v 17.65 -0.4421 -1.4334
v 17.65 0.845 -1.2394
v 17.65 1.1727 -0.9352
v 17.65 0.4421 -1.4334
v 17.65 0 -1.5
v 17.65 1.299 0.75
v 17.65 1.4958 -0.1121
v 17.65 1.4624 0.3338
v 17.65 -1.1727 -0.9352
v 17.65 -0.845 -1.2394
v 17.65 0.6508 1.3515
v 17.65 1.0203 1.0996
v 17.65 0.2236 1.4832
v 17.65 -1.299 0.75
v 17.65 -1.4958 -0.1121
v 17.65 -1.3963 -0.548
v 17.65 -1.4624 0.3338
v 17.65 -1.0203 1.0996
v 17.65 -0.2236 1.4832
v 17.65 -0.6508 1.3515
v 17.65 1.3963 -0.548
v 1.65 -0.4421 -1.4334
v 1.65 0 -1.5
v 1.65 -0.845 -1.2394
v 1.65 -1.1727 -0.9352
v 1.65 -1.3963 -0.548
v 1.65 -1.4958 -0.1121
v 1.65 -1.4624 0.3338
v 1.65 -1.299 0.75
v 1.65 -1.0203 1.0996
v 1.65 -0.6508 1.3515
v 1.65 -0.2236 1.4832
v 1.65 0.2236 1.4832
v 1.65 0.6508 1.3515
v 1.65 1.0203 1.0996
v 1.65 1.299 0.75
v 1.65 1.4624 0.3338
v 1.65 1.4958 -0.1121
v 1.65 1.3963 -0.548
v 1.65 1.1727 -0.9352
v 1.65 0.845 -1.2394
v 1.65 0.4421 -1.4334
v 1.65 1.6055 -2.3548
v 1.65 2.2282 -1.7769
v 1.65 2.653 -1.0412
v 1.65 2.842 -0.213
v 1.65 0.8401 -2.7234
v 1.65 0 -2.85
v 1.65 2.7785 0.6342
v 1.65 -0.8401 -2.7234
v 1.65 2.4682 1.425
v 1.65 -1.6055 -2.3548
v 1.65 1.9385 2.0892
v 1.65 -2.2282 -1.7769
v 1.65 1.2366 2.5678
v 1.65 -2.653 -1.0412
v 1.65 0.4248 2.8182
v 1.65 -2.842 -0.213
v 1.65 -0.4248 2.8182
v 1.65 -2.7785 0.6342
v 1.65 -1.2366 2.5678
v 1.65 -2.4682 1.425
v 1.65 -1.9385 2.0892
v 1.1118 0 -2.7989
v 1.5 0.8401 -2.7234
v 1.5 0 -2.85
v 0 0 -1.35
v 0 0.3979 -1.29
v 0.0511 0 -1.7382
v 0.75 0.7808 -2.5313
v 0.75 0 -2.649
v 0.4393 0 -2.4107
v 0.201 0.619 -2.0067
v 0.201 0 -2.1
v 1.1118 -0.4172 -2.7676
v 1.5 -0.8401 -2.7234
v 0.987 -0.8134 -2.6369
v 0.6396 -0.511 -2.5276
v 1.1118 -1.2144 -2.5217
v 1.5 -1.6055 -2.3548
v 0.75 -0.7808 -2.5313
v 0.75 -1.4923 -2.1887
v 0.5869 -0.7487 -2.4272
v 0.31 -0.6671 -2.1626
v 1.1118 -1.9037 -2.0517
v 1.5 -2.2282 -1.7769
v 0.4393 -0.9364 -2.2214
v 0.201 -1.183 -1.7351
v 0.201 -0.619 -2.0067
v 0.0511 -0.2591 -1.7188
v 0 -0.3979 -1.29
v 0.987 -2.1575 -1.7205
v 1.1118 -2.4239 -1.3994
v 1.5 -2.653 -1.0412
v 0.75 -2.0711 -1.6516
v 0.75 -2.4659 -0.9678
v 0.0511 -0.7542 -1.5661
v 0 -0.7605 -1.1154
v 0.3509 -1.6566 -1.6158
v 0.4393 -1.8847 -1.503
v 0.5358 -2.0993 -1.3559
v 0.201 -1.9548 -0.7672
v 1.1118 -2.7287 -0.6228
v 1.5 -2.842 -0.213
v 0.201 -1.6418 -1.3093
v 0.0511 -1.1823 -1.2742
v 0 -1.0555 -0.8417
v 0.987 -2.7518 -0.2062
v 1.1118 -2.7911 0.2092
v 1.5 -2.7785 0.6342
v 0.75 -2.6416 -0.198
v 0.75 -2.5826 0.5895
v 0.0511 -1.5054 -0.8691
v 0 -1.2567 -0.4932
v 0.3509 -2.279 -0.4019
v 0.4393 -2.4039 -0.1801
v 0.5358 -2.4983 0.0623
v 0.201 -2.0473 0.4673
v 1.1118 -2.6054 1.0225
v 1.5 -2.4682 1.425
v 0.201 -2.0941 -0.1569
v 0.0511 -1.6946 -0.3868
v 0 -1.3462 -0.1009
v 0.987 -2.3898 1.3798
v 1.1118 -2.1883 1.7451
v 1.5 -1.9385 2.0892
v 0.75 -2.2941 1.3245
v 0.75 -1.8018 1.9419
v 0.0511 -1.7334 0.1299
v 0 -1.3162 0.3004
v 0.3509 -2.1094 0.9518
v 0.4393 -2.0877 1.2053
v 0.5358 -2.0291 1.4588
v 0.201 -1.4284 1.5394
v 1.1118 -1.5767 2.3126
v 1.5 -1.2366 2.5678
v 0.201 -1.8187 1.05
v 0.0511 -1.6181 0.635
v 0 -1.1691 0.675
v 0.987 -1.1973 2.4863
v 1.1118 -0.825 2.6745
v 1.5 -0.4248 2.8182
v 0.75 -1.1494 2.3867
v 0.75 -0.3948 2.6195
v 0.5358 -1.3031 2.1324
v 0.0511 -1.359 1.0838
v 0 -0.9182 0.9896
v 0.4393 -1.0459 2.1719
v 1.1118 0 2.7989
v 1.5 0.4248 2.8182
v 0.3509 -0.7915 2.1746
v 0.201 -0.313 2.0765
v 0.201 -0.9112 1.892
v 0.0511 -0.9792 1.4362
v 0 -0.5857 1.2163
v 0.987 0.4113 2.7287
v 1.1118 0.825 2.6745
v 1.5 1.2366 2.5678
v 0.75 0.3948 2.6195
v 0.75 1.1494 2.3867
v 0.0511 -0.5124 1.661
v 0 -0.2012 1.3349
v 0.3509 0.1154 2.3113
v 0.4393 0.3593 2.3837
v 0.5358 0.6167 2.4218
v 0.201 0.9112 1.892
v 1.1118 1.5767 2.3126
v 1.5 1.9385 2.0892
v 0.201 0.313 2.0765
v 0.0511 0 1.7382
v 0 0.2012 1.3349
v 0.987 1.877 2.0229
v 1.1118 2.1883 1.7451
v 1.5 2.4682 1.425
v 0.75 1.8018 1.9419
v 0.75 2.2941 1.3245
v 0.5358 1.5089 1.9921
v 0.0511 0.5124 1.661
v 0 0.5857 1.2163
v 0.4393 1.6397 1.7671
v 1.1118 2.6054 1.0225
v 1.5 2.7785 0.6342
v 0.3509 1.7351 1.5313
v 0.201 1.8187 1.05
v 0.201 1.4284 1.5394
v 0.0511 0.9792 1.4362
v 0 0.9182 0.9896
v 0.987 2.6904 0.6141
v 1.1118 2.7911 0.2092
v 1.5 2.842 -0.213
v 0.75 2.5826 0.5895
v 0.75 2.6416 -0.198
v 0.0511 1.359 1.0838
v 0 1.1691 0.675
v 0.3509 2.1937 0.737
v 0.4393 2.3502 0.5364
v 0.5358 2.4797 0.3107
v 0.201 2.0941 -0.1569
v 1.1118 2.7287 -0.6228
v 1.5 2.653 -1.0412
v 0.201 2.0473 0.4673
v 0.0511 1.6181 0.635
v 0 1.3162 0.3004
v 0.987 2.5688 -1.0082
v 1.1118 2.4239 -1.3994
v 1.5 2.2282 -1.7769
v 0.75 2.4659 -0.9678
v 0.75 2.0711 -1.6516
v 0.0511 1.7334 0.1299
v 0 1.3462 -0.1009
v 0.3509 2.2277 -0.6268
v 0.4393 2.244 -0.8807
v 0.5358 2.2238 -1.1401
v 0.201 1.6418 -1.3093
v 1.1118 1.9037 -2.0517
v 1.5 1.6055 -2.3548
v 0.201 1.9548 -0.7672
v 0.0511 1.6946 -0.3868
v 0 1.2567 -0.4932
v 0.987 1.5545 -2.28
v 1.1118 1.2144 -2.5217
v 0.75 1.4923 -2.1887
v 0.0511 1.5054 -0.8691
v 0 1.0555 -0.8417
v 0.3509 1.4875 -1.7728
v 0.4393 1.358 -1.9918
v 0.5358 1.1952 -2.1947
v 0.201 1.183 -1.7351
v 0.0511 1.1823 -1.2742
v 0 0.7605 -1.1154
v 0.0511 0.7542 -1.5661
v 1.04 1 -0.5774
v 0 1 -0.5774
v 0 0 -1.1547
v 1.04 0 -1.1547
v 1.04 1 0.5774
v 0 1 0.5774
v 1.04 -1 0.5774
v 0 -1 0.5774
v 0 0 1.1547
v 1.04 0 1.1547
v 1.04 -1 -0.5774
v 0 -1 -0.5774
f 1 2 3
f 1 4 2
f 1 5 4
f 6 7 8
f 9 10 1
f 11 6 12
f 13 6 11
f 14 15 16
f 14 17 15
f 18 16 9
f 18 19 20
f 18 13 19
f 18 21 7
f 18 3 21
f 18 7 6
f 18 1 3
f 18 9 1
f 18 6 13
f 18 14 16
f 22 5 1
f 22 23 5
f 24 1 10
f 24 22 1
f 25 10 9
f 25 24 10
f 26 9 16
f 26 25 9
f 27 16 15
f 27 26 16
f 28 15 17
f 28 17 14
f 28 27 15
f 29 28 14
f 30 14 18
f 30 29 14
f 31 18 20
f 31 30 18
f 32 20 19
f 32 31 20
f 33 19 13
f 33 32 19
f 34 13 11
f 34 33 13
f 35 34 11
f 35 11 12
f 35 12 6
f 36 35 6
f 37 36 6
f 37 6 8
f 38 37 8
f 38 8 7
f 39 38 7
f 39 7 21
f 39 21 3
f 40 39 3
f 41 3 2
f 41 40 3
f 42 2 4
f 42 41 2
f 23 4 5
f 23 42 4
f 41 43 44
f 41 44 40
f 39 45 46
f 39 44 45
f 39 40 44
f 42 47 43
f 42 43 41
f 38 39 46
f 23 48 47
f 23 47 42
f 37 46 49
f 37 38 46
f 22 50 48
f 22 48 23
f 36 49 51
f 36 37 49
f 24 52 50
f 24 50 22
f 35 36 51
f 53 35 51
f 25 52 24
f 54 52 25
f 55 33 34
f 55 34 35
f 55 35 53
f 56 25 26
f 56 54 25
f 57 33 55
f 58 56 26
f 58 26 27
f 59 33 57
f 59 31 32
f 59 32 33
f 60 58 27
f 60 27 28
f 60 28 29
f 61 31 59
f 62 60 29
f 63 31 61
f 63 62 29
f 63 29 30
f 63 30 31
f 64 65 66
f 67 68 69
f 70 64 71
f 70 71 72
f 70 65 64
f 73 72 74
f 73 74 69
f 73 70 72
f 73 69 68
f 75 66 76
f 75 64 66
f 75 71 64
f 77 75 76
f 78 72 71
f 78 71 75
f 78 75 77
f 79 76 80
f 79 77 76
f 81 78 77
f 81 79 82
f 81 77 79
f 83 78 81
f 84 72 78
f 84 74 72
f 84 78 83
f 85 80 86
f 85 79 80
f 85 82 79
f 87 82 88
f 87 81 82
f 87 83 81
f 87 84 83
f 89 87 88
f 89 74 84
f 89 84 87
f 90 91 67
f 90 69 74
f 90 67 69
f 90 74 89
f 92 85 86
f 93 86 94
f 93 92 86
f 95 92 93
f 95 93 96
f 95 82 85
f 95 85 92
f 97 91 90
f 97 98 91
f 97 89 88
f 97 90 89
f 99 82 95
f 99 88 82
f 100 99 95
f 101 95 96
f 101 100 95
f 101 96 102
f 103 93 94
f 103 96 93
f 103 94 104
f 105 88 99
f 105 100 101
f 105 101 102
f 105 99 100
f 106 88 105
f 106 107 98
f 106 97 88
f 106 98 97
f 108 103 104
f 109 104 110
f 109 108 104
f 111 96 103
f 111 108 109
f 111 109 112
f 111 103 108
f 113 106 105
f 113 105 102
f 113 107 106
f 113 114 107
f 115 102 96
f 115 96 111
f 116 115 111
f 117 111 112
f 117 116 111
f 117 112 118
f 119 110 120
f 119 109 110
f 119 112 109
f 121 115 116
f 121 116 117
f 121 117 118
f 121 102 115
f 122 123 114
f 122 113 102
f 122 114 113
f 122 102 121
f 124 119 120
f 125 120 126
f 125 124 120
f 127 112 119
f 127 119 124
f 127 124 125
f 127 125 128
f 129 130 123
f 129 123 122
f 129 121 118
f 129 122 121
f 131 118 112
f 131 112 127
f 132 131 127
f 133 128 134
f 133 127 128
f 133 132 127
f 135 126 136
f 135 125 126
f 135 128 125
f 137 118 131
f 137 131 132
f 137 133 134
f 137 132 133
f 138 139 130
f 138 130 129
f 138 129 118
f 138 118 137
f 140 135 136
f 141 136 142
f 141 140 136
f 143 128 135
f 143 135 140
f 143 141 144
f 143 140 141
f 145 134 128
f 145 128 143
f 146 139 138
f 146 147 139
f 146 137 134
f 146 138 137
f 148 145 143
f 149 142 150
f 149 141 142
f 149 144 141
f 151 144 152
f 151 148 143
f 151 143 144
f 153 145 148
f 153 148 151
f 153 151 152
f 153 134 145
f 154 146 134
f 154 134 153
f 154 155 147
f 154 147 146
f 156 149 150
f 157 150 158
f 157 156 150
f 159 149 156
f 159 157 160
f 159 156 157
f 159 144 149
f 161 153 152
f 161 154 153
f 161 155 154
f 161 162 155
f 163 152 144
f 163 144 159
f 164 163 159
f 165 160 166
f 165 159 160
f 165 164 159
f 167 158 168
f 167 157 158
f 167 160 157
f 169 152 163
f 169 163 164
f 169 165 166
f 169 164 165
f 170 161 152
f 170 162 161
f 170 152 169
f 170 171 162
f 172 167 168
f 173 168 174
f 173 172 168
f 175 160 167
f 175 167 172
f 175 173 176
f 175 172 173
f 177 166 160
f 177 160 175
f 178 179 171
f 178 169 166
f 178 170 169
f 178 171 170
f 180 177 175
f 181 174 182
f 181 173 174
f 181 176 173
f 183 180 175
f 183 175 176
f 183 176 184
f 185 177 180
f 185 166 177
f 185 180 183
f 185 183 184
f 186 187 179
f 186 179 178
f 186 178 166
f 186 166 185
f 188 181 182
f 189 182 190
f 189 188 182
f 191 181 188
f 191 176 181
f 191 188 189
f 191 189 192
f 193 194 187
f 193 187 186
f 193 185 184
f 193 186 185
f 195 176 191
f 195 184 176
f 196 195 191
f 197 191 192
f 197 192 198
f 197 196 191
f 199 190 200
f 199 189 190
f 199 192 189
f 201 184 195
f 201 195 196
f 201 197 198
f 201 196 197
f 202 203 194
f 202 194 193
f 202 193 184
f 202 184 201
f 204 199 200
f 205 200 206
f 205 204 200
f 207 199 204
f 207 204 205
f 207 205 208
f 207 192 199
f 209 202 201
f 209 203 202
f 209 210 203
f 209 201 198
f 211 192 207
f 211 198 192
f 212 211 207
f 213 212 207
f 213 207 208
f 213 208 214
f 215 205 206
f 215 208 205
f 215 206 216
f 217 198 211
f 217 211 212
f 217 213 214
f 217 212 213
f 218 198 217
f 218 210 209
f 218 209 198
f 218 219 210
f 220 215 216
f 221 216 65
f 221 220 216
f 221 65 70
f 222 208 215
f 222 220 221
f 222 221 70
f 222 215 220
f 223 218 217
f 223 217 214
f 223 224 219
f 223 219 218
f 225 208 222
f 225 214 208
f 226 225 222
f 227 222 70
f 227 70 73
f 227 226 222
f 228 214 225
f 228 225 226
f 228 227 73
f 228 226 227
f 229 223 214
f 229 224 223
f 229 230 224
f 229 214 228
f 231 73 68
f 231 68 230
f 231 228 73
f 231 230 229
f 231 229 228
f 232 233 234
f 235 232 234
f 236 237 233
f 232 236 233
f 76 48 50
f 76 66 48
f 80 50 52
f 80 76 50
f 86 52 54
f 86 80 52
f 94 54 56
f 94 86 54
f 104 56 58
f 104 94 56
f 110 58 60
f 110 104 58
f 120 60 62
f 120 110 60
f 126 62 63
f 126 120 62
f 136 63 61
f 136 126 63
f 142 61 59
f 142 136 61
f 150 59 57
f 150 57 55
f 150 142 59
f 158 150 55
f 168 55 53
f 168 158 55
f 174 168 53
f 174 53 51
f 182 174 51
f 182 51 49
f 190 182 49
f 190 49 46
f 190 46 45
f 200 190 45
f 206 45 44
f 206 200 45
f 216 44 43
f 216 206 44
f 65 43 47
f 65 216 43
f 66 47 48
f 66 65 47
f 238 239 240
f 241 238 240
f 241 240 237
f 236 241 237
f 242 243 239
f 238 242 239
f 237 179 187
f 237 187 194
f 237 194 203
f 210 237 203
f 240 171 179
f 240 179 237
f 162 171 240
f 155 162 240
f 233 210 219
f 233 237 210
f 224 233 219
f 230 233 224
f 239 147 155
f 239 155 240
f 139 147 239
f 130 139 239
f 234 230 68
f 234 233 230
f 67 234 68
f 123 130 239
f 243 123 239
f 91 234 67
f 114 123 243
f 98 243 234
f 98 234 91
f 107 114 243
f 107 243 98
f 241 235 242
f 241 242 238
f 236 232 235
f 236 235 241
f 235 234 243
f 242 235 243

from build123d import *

# Parameters (mm, degrees)
CUT_EXTRUDE1_DEPTH = 1.04


with BuildPart() as part:
    # Sketch1 → Revolve1 (revolve)
    with BuildSketch(Plane(origin=(0, 0, 0), x_dir=(1, 0, 0), z_dir=(0, 1, 0))):
        with BuildLine():
            Line((0, 0), (17.65, 0))
            Line((17.65, 0), (17.65, 1.5))
            Line((17.65, 1.5), (1.65, 1.5))
            Line((1.65, 1.5), (1.65, 2.85))
            Line((1.65, 2.85), (1.5, 2.85))
            ThreePointArc((1.5, 2.85), (0.439339828, 2.410660172), (0, 1.35))
            Line((0, 1.35), (0, 0))
        make_face()
    revolve(axis=Axis((0, 0, 0), (-1, 0, 0)))

    # Sketch2 → Cut-Extrude1 (cut)
    with BuildSketch(Plane.ZY):
        Polygon((1.154700538, 0), (0.577350269, 1), (-0.577350269, 1), (-1.154700538, 0), (-0.577350269, -1), (0.577350269, -1), align=None)
    extrude(amount=-CUT_EXTRUDE1_DEPTH, mode=Mode.SUBTRACT)


solid = part.part
